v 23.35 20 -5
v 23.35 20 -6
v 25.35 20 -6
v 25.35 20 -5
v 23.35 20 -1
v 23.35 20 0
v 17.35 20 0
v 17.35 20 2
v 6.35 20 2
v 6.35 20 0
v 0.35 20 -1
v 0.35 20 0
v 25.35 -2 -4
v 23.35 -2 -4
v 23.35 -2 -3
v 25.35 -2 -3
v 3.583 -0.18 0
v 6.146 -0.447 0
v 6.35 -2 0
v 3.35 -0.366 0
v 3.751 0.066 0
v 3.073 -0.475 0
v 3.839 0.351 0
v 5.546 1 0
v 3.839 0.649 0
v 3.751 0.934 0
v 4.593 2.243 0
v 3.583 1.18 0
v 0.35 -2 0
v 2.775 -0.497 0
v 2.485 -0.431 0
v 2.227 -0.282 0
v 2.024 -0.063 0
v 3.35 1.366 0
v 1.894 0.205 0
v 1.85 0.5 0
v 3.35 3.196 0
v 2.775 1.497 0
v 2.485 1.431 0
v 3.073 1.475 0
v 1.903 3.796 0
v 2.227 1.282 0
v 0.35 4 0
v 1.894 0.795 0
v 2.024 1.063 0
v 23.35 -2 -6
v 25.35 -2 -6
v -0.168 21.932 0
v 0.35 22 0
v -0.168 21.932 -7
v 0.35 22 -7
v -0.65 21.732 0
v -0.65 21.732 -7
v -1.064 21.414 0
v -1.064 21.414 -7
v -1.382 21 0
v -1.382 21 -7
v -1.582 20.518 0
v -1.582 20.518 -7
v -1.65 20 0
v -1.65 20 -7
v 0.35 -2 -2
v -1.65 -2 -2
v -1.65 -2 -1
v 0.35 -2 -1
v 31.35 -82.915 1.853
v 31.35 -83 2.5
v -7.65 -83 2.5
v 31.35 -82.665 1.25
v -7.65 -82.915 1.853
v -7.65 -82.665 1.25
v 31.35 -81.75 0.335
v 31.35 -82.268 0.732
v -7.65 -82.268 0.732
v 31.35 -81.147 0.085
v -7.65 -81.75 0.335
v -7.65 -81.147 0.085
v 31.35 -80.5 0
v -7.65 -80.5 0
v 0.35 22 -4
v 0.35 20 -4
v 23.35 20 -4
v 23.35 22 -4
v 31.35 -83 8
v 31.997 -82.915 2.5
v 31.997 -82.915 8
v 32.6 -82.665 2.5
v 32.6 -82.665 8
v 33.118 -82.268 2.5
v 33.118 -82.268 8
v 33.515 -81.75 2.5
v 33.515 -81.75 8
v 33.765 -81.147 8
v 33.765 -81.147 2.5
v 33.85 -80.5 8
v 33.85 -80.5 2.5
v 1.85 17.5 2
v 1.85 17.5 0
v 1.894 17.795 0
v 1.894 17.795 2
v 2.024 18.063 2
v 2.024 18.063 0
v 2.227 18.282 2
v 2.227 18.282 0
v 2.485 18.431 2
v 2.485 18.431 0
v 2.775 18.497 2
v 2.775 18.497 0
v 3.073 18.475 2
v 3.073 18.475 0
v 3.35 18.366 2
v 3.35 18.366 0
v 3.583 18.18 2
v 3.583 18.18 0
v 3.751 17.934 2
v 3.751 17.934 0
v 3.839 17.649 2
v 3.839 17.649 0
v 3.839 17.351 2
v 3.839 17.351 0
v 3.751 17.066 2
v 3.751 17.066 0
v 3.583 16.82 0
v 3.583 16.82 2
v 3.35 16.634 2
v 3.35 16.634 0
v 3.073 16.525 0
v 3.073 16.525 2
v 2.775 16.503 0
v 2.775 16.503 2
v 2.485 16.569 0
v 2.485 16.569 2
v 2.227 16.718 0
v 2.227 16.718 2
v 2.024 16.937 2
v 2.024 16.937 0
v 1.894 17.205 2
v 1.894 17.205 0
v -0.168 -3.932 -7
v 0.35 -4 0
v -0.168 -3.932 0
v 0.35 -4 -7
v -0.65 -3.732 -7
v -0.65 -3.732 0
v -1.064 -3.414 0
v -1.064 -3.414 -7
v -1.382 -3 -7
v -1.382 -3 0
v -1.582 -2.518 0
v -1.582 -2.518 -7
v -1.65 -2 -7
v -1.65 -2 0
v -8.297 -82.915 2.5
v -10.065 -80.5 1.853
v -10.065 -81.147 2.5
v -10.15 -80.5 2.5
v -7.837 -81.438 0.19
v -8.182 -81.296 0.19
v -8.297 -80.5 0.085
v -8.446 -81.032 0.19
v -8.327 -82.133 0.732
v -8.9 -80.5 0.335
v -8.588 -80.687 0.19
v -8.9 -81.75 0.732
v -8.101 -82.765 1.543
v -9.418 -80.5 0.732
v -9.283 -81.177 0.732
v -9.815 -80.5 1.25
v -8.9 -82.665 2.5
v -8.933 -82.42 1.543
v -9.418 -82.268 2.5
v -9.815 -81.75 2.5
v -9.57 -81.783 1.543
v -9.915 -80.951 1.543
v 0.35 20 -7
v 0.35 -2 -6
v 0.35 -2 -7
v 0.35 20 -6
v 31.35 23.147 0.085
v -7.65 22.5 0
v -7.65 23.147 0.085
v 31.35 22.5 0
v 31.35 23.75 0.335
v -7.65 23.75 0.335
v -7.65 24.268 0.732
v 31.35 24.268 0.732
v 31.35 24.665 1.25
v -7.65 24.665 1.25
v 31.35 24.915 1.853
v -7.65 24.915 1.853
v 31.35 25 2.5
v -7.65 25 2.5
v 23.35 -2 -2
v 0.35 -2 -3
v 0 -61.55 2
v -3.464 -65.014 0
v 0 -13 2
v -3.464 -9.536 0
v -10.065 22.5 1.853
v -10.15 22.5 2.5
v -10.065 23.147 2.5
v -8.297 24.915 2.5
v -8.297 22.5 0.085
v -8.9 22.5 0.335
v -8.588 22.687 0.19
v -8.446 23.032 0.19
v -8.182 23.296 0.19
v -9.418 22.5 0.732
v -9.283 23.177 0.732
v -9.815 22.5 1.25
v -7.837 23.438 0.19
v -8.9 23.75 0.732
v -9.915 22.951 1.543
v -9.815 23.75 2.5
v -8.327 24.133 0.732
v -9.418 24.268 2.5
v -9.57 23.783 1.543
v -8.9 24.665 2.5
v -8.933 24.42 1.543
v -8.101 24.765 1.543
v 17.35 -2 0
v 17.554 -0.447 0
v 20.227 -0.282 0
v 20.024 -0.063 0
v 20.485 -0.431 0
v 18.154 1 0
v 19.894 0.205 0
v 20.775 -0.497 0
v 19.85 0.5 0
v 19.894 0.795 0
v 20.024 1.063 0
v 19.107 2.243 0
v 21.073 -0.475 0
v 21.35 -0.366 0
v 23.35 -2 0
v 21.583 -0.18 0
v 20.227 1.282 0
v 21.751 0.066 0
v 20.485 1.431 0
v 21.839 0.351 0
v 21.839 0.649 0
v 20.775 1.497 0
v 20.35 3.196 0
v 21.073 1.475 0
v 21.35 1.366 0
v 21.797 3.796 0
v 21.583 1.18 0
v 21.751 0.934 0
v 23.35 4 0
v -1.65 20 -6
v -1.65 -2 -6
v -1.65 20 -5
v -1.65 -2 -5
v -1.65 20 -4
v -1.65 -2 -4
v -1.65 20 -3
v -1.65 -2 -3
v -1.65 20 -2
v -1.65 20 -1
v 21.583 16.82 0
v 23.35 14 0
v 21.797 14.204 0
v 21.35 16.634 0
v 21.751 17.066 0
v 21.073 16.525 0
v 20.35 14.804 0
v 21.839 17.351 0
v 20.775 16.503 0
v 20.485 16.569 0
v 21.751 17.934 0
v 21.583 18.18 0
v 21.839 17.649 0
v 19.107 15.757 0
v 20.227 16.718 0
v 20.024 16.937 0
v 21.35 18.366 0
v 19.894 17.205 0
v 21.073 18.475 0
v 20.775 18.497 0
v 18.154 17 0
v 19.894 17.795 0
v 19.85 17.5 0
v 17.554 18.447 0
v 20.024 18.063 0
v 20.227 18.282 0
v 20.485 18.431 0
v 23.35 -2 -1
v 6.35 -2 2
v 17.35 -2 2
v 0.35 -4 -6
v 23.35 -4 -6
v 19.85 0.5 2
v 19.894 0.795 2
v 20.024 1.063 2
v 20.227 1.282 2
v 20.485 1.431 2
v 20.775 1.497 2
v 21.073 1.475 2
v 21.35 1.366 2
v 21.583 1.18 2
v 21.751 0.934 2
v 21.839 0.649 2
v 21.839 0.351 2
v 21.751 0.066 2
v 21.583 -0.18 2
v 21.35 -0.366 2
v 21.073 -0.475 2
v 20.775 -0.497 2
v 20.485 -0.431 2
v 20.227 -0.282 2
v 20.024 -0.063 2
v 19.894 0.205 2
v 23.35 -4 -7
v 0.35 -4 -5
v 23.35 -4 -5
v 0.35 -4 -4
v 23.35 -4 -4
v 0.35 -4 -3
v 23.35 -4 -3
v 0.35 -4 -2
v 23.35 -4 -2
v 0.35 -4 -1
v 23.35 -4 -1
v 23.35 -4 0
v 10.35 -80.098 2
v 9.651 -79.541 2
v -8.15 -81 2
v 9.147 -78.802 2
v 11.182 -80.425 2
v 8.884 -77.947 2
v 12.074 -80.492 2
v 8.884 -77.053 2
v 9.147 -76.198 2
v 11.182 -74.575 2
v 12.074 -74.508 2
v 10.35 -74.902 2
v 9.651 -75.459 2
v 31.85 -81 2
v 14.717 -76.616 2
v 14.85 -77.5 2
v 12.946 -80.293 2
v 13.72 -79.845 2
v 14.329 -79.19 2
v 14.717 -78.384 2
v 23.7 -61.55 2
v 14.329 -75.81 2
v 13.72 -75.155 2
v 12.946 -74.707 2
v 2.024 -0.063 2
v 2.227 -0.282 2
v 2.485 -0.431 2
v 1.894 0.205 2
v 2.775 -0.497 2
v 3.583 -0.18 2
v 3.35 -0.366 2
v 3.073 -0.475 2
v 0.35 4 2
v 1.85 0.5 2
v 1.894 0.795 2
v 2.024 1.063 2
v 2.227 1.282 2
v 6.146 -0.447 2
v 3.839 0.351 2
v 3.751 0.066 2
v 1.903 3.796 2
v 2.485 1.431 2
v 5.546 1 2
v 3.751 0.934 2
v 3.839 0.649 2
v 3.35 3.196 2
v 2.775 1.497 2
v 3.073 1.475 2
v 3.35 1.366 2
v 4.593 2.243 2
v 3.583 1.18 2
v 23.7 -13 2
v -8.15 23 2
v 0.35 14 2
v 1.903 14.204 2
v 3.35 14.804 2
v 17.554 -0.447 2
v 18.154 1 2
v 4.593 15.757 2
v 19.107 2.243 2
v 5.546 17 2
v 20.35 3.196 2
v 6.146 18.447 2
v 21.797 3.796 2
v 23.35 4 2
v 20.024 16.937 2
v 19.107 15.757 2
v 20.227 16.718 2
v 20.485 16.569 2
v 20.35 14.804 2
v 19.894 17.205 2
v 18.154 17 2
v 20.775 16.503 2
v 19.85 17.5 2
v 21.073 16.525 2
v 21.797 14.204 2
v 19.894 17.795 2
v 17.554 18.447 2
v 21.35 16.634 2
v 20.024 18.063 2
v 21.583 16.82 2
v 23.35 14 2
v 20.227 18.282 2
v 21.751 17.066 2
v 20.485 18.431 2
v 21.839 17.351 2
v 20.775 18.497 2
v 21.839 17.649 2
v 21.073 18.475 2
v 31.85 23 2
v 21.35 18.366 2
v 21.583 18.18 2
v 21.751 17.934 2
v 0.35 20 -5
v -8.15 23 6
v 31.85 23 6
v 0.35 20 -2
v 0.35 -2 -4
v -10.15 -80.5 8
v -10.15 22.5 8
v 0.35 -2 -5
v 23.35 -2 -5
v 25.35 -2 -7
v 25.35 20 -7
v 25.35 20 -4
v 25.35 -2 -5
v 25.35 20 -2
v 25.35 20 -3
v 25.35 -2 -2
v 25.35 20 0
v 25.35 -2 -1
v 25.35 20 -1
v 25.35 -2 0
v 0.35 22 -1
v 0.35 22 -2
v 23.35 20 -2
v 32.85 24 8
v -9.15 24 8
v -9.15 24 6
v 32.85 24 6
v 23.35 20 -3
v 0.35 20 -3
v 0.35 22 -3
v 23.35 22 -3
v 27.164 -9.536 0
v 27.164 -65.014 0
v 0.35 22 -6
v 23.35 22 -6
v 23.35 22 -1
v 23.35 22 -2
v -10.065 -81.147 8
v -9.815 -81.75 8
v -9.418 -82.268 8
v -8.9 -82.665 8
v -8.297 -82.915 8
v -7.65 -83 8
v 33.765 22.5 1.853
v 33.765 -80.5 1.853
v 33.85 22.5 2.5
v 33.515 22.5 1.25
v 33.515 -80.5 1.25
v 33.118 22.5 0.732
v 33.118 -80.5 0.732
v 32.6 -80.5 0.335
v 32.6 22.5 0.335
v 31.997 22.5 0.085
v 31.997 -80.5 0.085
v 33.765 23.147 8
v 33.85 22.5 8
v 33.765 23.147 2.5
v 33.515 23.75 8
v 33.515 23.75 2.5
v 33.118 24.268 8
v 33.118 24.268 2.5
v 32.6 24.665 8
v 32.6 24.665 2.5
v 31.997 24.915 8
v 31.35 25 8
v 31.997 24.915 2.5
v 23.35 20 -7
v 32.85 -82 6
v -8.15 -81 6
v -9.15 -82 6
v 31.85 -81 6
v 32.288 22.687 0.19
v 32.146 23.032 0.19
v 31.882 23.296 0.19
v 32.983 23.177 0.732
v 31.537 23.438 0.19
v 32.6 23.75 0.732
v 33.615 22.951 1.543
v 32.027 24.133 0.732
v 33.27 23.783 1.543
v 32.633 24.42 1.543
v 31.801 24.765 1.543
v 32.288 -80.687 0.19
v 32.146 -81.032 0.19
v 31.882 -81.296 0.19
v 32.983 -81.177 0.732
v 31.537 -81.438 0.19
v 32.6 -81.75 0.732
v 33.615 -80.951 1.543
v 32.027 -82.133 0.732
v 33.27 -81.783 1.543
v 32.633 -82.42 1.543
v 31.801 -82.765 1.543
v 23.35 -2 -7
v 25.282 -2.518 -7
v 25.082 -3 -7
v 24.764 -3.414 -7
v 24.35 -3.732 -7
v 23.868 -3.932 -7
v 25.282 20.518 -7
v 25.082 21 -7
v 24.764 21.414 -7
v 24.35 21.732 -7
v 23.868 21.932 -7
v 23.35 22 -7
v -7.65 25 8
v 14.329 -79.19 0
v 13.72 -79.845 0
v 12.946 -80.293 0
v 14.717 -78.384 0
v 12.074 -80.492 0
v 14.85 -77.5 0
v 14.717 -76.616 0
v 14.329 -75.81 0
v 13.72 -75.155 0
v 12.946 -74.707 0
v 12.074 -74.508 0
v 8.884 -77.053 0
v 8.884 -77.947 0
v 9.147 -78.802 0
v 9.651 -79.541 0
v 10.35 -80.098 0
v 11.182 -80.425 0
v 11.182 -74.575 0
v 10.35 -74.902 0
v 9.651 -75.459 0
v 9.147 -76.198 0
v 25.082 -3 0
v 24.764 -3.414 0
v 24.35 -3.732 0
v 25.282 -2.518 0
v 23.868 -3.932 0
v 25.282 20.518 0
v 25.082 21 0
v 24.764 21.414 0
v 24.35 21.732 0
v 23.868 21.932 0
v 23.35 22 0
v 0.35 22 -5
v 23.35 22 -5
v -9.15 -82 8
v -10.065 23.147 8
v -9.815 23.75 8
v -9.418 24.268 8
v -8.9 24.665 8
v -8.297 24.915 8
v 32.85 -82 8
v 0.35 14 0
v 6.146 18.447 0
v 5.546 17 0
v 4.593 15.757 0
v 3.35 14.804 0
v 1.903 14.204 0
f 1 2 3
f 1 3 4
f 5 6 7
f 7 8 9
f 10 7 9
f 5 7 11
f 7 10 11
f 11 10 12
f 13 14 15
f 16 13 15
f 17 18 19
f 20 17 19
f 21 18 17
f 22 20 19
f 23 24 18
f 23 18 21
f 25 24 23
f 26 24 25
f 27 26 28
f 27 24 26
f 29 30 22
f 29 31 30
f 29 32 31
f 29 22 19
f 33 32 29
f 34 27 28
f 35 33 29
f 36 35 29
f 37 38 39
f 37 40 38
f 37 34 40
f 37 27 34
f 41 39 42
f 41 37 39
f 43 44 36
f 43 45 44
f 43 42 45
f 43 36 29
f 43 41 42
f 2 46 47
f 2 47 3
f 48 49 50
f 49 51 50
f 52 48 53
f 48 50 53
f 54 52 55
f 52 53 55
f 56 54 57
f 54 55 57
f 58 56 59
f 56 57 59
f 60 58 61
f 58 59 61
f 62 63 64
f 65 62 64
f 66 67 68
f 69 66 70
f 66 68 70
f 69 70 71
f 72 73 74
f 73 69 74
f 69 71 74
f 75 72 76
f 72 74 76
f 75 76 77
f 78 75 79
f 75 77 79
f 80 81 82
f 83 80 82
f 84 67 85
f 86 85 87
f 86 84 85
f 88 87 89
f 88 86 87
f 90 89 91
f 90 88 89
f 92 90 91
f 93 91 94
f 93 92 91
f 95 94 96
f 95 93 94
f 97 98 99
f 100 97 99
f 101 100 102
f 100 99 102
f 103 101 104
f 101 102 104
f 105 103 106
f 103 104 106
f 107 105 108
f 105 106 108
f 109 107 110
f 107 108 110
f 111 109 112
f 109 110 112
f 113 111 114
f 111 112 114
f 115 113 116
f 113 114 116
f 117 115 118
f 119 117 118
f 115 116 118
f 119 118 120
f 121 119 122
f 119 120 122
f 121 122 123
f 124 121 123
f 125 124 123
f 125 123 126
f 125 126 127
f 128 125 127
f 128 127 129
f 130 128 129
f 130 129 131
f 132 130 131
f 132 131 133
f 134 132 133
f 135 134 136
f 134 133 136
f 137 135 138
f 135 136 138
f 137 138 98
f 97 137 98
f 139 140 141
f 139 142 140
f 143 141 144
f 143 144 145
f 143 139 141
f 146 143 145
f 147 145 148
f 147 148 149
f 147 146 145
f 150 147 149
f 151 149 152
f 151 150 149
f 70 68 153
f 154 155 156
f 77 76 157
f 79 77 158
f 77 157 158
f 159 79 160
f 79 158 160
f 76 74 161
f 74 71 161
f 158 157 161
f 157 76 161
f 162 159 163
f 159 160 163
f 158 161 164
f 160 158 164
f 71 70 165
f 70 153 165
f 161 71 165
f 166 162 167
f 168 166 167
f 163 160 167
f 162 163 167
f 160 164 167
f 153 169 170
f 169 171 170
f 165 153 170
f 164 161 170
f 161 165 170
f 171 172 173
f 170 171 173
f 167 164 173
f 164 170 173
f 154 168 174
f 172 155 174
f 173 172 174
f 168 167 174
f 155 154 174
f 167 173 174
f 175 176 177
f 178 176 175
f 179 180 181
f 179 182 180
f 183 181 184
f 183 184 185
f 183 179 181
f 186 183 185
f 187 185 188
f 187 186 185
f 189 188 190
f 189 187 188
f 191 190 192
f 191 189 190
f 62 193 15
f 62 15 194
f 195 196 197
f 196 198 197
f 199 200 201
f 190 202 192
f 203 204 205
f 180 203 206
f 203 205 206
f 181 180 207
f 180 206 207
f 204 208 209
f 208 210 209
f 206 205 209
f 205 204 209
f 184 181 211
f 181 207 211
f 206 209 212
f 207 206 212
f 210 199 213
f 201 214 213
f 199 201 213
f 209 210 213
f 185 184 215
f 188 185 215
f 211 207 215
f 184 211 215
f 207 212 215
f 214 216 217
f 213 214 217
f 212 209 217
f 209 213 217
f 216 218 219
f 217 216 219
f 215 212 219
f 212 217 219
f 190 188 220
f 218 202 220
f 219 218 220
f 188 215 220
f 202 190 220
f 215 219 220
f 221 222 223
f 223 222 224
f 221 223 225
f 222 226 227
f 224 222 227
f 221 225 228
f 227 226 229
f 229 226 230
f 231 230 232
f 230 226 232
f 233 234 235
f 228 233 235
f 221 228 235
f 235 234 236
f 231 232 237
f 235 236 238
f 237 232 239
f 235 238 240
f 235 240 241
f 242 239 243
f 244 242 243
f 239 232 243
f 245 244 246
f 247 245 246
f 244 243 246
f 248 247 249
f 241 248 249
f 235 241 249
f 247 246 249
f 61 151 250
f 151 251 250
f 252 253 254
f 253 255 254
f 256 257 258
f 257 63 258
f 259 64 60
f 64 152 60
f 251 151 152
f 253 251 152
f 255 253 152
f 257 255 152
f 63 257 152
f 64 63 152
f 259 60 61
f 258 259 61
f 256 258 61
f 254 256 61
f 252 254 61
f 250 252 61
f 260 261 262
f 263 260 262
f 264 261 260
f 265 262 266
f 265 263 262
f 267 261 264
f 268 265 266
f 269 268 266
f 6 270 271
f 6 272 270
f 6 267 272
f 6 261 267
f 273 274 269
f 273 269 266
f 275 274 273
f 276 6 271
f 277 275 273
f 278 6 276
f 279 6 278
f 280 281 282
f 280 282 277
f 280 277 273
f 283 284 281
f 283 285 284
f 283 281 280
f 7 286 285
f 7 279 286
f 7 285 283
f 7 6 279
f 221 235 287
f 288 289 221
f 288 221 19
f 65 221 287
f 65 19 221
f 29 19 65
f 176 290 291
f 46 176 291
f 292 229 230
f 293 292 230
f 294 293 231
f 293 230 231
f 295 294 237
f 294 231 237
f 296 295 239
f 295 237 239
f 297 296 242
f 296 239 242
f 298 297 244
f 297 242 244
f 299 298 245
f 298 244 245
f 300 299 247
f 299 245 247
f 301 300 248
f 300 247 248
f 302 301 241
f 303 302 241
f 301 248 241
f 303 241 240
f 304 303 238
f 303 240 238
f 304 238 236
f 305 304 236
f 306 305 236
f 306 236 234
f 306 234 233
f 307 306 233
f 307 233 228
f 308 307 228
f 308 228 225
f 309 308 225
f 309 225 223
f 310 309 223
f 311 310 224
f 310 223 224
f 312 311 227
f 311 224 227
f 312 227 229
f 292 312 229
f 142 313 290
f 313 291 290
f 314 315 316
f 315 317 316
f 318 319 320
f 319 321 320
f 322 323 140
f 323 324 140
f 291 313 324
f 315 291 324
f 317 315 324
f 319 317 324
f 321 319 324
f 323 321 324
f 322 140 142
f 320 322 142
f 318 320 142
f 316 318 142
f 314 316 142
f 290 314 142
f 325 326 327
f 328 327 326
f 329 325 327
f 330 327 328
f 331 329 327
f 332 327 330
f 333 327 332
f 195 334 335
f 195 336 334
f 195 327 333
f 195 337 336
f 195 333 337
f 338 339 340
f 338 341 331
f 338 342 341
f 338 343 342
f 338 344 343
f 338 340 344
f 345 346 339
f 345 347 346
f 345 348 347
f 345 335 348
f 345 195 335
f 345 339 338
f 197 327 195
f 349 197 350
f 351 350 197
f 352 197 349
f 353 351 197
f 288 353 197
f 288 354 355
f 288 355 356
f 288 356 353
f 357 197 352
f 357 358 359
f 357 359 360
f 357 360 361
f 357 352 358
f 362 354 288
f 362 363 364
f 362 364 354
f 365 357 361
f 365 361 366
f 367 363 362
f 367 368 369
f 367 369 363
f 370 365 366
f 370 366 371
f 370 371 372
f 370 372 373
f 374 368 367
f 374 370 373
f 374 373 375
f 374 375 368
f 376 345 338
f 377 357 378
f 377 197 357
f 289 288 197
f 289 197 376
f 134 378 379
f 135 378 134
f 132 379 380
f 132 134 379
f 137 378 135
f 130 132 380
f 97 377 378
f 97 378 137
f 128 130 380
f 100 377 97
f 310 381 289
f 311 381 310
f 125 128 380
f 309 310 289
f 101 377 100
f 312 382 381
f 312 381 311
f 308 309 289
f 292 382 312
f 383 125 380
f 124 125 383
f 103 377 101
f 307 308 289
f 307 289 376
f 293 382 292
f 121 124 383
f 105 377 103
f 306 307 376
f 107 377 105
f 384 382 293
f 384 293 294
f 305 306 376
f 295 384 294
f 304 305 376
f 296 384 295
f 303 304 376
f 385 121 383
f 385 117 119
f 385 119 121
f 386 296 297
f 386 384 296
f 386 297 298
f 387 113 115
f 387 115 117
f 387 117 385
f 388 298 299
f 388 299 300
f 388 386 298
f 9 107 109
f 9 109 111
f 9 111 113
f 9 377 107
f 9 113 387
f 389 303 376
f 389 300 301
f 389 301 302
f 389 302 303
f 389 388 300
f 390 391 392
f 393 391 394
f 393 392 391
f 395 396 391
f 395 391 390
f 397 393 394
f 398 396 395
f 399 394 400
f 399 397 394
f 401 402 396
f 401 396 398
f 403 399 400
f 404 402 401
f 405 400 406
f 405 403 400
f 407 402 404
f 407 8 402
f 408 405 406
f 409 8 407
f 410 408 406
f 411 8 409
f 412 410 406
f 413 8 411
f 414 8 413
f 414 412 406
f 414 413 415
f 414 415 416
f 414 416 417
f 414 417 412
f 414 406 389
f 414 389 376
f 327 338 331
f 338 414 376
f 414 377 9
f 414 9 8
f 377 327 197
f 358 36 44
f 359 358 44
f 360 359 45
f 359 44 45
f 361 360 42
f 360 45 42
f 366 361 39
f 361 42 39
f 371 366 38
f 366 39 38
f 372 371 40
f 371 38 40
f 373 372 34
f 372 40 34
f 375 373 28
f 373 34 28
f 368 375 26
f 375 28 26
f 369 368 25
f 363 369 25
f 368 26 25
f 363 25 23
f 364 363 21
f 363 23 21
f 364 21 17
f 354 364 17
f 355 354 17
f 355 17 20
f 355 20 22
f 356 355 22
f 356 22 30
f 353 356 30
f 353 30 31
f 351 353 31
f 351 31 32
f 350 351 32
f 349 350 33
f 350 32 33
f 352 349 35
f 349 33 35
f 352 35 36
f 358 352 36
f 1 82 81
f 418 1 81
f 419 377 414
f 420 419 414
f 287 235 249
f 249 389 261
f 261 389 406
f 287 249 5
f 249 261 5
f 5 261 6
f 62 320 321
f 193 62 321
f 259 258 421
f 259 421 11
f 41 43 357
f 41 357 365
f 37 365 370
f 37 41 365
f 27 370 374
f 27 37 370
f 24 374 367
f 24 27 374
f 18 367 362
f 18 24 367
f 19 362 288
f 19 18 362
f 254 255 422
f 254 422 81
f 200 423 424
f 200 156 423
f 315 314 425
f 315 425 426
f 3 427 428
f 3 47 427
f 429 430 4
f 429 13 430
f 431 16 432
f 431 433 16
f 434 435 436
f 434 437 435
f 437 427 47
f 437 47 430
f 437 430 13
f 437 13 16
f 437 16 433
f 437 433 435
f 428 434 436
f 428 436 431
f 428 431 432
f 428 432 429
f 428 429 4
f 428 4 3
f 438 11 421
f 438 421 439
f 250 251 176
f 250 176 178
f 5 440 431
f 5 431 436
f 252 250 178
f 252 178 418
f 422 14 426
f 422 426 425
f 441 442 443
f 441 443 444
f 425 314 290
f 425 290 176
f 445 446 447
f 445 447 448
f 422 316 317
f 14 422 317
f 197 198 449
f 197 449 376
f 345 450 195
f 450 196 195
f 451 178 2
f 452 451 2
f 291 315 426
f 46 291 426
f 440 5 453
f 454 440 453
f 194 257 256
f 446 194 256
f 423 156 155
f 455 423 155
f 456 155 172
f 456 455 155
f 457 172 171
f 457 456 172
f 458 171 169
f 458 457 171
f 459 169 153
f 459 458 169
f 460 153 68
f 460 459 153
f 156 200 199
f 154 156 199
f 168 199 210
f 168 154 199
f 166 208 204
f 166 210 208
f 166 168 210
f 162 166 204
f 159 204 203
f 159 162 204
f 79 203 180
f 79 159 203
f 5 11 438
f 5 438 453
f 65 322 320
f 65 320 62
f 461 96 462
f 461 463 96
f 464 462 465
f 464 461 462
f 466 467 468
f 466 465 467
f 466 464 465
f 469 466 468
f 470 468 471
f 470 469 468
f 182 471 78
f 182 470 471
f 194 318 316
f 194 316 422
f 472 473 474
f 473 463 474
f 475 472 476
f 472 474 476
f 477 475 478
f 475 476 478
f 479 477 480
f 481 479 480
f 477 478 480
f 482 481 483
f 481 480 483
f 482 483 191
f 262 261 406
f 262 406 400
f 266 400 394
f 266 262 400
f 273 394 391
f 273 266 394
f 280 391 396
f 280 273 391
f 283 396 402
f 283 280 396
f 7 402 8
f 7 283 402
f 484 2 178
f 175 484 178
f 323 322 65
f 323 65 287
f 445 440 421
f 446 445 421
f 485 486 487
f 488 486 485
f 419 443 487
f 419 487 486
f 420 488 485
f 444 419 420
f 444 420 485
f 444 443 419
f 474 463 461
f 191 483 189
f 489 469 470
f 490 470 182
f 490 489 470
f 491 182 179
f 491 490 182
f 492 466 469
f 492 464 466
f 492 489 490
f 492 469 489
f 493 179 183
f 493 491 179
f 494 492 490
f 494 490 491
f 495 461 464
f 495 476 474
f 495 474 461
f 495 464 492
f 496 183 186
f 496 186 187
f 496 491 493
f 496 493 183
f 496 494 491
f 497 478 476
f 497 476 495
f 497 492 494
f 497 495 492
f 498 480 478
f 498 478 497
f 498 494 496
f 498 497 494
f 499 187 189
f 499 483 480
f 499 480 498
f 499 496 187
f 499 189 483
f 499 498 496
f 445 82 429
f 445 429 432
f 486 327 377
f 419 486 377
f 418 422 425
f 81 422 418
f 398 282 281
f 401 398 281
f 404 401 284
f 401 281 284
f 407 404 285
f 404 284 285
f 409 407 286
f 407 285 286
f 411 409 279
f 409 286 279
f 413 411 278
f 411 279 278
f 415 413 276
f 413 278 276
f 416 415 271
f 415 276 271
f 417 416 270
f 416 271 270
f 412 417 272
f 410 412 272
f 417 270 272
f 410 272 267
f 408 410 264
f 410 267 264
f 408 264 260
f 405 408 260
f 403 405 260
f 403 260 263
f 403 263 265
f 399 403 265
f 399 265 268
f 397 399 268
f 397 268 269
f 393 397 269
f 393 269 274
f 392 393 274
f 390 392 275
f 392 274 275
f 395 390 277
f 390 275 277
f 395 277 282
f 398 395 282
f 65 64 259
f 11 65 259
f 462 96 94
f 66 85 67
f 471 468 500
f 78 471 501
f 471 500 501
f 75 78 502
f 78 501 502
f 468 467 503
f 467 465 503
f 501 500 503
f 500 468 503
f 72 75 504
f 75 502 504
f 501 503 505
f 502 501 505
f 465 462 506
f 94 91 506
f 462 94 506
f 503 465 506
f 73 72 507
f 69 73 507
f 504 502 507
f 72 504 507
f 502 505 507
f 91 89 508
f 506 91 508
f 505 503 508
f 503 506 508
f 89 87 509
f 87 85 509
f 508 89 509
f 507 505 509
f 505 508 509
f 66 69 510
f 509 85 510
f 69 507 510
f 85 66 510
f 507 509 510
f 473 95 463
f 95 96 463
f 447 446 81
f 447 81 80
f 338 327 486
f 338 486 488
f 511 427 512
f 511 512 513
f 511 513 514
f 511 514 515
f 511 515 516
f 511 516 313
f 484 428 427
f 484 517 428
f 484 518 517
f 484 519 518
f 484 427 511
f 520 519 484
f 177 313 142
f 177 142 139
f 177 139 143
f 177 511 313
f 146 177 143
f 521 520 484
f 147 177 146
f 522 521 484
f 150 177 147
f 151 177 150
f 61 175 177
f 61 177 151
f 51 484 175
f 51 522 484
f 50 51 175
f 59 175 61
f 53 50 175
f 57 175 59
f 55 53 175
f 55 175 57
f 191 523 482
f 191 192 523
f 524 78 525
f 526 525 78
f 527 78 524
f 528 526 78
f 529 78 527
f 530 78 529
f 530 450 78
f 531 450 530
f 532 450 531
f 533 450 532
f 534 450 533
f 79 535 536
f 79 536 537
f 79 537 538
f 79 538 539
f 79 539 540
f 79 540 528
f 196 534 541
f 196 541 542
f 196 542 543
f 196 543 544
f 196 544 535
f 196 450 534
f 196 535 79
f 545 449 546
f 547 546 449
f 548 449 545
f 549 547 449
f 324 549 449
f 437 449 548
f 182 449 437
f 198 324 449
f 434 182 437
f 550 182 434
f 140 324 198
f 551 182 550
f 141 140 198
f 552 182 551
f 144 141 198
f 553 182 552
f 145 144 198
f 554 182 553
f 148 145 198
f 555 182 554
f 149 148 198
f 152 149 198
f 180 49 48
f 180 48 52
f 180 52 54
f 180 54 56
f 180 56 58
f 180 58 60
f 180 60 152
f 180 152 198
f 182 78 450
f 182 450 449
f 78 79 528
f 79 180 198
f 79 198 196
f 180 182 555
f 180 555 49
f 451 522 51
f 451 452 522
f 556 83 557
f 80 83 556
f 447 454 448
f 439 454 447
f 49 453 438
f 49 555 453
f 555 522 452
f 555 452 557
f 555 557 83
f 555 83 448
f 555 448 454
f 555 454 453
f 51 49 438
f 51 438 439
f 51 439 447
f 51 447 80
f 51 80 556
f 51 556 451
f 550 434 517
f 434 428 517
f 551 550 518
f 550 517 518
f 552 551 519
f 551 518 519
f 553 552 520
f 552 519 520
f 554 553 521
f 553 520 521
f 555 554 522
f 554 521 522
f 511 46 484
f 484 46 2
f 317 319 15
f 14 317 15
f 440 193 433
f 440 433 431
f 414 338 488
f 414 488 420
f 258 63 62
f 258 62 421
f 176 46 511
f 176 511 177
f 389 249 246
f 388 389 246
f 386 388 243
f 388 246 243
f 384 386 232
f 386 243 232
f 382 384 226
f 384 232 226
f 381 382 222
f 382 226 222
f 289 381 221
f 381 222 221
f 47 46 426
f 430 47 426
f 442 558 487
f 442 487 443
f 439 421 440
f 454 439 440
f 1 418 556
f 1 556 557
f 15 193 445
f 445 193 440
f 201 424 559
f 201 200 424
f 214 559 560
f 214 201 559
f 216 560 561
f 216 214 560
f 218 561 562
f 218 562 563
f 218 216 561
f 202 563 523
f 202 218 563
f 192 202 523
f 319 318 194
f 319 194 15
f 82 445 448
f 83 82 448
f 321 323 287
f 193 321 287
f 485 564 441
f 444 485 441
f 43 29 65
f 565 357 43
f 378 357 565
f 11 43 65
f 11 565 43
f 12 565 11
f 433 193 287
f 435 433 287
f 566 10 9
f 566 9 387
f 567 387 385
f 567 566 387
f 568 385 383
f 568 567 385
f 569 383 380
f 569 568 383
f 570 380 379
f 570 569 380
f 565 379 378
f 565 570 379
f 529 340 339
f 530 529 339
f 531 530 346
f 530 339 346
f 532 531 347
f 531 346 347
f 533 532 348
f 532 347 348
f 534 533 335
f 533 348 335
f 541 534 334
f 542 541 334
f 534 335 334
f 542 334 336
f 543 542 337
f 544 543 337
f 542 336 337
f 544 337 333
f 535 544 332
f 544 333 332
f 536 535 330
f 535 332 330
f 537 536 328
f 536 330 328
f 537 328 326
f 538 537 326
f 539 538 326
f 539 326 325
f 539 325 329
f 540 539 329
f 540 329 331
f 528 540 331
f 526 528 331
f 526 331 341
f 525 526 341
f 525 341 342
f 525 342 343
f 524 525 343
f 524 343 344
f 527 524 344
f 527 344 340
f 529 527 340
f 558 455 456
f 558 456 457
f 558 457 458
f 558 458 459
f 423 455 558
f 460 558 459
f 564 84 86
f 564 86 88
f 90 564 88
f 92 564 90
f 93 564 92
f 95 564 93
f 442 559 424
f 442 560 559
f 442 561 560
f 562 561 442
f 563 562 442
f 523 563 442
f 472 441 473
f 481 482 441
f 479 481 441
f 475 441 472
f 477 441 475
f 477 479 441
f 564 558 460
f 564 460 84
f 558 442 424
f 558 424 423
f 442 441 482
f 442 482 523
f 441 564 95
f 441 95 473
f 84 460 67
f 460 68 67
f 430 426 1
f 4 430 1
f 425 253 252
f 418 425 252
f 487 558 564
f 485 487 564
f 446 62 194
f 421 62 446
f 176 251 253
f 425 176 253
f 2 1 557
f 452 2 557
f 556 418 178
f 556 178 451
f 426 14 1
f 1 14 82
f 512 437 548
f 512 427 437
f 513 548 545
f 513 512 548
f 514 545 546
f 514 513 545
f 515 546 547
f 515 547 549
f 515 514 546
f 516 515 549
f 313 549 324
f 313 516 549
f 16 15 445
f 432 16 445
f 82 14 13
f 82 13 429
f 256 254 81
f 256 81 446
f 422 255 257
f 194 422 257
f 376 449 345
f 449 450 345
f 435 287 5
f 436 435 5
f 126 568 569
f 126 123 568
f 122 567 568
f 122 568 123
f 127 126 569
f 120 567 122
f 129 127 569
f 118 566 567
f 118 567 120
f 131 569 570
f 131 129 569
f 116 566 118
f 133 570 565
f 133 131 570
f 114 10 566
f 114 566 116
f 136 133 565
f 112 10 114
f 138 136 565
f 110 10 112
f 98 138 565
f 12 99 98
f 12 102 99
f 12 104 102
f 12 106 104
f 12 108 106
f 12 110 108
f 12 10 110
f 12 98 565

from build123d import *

# Parameters (mm, degrees)
SKICA1_W                 = 23.7
SKICA1_H                 = 48.55
SKICA1_W_2               = 23
SKICA1_H_2               = 22
P_IDAT_VYSUNUT_M1_DEPTH  = 2
SKICA3_R                 = 3
ODEBRAT_VYSUNUT_M1_DEPTH = 4
ZKOSEN_1_SIZE            = 3.464101615
ZKOSEN_1_SIZE_2          = 2
SKICA5_W                 = 44
SKICA5_H                 = 108
SKICA5_W_2               = 40
SKICA5_H_2               = 104
P_IDAT_VYSUNUT_M3_DEPTH  = 6
ZAOBLIT2_R               = 2.5
SKICA6_W                 = 27
SKICA6_H                 = 26
SKICA6_W_2               = 23
SKICA6_H_2               = 22
P_IDAT_VYSUNUT_M4_DEPTH  = 7
SKICA7_R                 = 1
P_IDAT_VYSUNUT_M5_DEPTH  = 2
SKICA8_W                 = 23
SKICA8_H                 = 1
ODEBRAT_VYSUNUT_M3_DEPTH = 30
SKICA9_W                 = 1
SKICA9_H                 = 22
ODEBRAT_VYSUNUT_M4_DEPTH = 30
ZAOBLIT3_R               = 2
SKICA10_W                = 42
SKICA10_H                = 106
SKICA10_W_2              = 40
SKICA10_H_2              = 104
ODEBRAT_VYSUNUT_M5_DEPTH = 2


# Some blends are built 0.0001 mm under size
with BuildPart() as part:
    # Skica1 → Přidat vysunutím1 (new body)
    with BuildSketch(Plane.XY):
        Polygon((-10.15, 2), (-10.15, 25), (33.85, 25), (33.85, 2), (33.85, -83), (-10.15, -83), (-10.15, -61.55), align=None)
        with Locations((11.85, -37.275)):
            Rectangle(SKICA1_W, SKICA1_H, mode=Mode.SUBTRACT)
        with Locations((11.85, 9)):
            Rectangle(SKICA1_W_2, SKICA1_H_2, mode=Mode.SUBTRACT)
    extrude(amount=P_IDAT_VYSUNUT_M1_DEPTH)

    # Skica3 → Odebrat vysunutím1 (cut)
    with BuildSketch(Plane.XY.offset(2)):
        with Locations((11.85, -77.5)):
            Circle(SKICA3_R)
    extrude(amount=-ODEBRAT_VYSUNUT_M1_DEPTH, mode=Mode.SUBTRACT)

    # Zkosení1
    # the kernel refuses this chamfer: 3.464101615, 2 mm, written as the material it takes off along each edge
    with BuildSketch(Plane(origin=(0, -13, 0), x_dir=(-0.9998132206222079, 0, -0.019326765612700626), z_dir=(0, -1, 0)), Plane(origin=(23.7, -61.55, 0), x_dir=(0.9998132206222079, 0, -0.019326765612700608), z_dir=(0, 1, 0))) as zkosen_1_piece_1:
        Polygon((ZKOSEN_1_SIZE * 0.999813220662, -ZKOSEN_1_SIZE * 0.0193267656135), (-ZKOSEN_1_SIZE_2 * 0.0193267656127, -ZKOSEN_1_SIZE_2 * 0.999813220622), (0, 0), align=None)
    extrude(amount=48.55, mode=Mode.SUBTRACT)
    with BuildSketch(Plane(origin=(0, -61.55, 0), x_dir=(0, -0.9998132206222079, -0.01932676561270056), z_dir=(1, 0, 0)), Plane(origin=(23.7, -13, 0), x_dir=(0, 0.9998132206222079, -0.019326765612700643), z_dir=(-1, 0, 0))) as zkosen_1_piece_2:
        Polygon((ZKOSEN_1_SIZE * 0.999813220662, -ZKOSEN_1_SIZE * 0.0193267656135), (-ZKOSEN_1_SIZE_2 * 0.0193267656127, -ZKOSEN_1_SIZE_2 * 0.999813220622), (0, 0), align=None)
    extrude(amount=23.7, mode=Mode.SUBTRACT)
    with BuildSketch(Plane(origin=(0, -4.038072059, 0), x_dir=(-0.9998132206222079, 0, -0.019326765612700622), z_dir=(0, -1, 0))) as zkosen_1_piece_3a_section:
        Polygon((ZKOSEN_1_SIZE * 0.999813220662, -ZKOSEN_1_SIZE * 0.0193267656135), (-ZKOSEN_1_SIZE_2 * 0.0193267656127, -ZKOSEN_1_SIZE_2 * 0.999813220622), (0, 0), align=None)
    zkosen_1_piece_3a = extrude(amount=57.511927941, mode=Mode.PRIVATE)
    zkosen_1_piece_3a = split(zkosen_1_piece_3a, bisect_by=Plane(origin=(-1.161798269, -13, 0.64133979), z_dir=(0, 1, 0)), keep=Keep.TOP, mode=Mode.PRIVATE)
    with BuildSketch(Plane(origin=(23.7, -13, 0), x_dir=(0, 0.9998132206222079, -0.019326765612700643), z_dir=(-1, 0, 0))) as zkosen_1_piece_3b_section:
        Polygon((ZKOSEN_1_SIZE * 0.999813220662, -ZKOSEN_1_SIZE * 0.0193267656135), (-ZKOSEN_1_SIZE_2 * 0.0193267656127, -ZKOSEN_1_SIZE_2 * 0.999813220622), (0, 0), align=None)
    zkosen_1_piece_3b = extrude(amount=32.661927941, mode=Mode.PRIVATE)
    zkosen_1_piece_3b = split(zkosen_1_piece_3b, bisect_by=Plane(origin=(0, -11.838201731, 0.64133979), z_dir=(-1, 0, 0)), keep=Keep.TOP, mode=Mode.PRIVATE)
    zkosen_1_piece_3 = zkosen_1_piece_3a & zkosen_1_piece_3b
    add(zkosen_1_piece_3, mode=Mode.SUBTRACT)
    with BuildSketch(Plane(origin=(0, -13, 0), x_dir=(-0.9998132206222079, 0, -0.019326765612700626), z_dir=(0, -1, 0))) as zkosen_1_piece_4a_section:
        Polygon((ZKOSEN_1_SIZE * 0.999813220662, -ZKOSEN_1_SIZE * 0.0193267656135), (-ZKOSEN_1_SIZE_2 * 0.0193267656127, -ZKOSEN_1_SIZE_2 * 0.999813220622), (0, 0), align=None)
    zkosen_1_piece_4a = extrude(amount=57.511927941, mode=Mode.PRIVATE)
    zkosen_1_piece_4a = split(zkosen_1_piece_4a, bisect_by=Plane(origin=(-1.161798269, -61.55, 0.64133979), z_dir=(0, -1, 0)), keep=Keep.TOP, mode=Mode.PRIVATE)
    with BuildSketch(Plane(origin=(-8.961927941, -61.55, 0), x_dir=(0, -0.9998132206222079, -0.01932676561270056), z_dir=(1, 0, 0))) as zkosen_1_piece_4b_section:
        Polygon((ZKOSEN_1_SIZE * 0.999813220662, -ZKOSEN_1_SIZE * 0.0193267656135), (-ZKOSEN_1_SIZE_2 * 0.0193267656127, -ZKOSEN_1_SIZE_2 * 0.999813220622), (0, 0), align=None)
    zkosen_1_piece_4b = extrude(amount=32.661927941, mode=Mode.PRIVATE)
    zkosen_1_piece_4b = split(zkosen_1_piece_4b, bisect_by=Plane(origin=(0, -62.711798269, 0.64133979), z_dir=(-1, 0, 0)), keep=Keep.TOP, mode=Mode.PRIVATE)
    zkosen_1_piece_4 = zkosen_1_piece_4a & zkosen_1_piece_4b
    add(zkosen_1_piece_4, mode=Mode.SUBTRACT)
    with BuildSketch(Plane(origin=(0, -61.55, 0), x_dir=(0, -0.9998132206222079, -0.01932676561270056), z_dir=(1, 0, 0))) as zkosen_1_piece_5a_section:
        Polygon((ZKOSEN_1_SIZE * 0.999813220662, -ZKOSEN_1_SIZE * 0.0193267656135), (-ZKOSEN_1_SIZE_2 * 0.0193267656127, -ZKOSEN_1_SIZE_2 * 0.999813220622), (0, 0), align=None)
    zkosen_1_piece_5a = extrude(amount=32.661927941, mode=Mode.PRIVATE)
    zkosen_1_piece_5a = split(zkosen_1_piece_5a, bisect_by=Plane(origin=(23.7, -62.711798269, 0.64133979), z_dir=(1, 0, 0)), keep=Keep.TOP, mode=Mode.PRIVATE)
    with BuildSketch(Plane(origin=(23.7, -70.511927941, 0), x_dir=(0.9998132206222079, 0, -0.019326765612700608), z_dir=(0, 1, 0))) as zkosen_1_piece_5b_section:
        Polygon((ZKOSEN_1_SIZE * 0.999813220662, -ZKOSEN_1_SIZE * 0.0193267656135), (-ZKOSEN_1_SIZE_2 * 0.0193267656127, -ZKOSEN_1_SIZE_2 * 0.999813220622), (0, 0), align=None)
    zkosen_1_piece_5b = extrude(amount=57.511927941, mode=Mode.PRIVATE)
    zkosen_1_piece_5b = split(zkosen_1_piece_5b, bisect_by=Plane(origin=(24.861798269, -61.55, 0.64133979), z_dir=(0, -1, 0)), keep=Keep.TOP, mode=Mode.PRIVATE)
    zkosen_1_piece_5 = zkosen_1_piece_5a & zkosen_1_piece_5b
    add(zkosen_1_piece_5, mode=Mode.SUBTRACT)
    with BuildSketch(Plane(origin=(32.661927941, -13, 0), x_dir=(0, 0.9998132206222079, -0.019326765612700643), z_dir=(-1, 0, 0))) as zkosen_1_piece_6a_section:
        Polygon((ZKOSEN_1_SIZE * 0.999813220662, -ZKOSEN_1_SIZE * 0.0193267656135), (-ZKOSEN_1_SIZE_2 * 0.0193267656127, -ZKOSEN_1_SIZE_2 * 0.999813220622), (0, 0), align=None)
    zkosen_1_piece_6a = extrude(amount=32.661927941, mode=Mode.PRIVATE)
    zkosen_1_piece_6a = split(zkosen_1_piece_6a, bisect_by=Plane(origin=(23.7, -11.838201731, 0.64133979), z_dir=(1, 0, 0)), keep=Keep.TOP, mode=Mode.PRIVATE)
    with BuildSketch(Plane(origin=(23.7, -61.55, 0), x_dir=(0.9998132206222079, 0, -0.019326765612700608), z_dir=(0, 1, 0))) as zkosen_1_piece_6b_section:
        Polygon((ZKOSEN_1_SIZE * 0.999813220662, -ZKOSEN_1_SIZE * 0.0193267656135), (-ZKOSEN_1_SIZE_2 * 0.0193267656127, -ZKOSEN_1_SIZE_2 * 0.999813220622), (0, 0), align=None)
    zkosen_1_piece_6b = extrude(amount=57.511927941, mode=Mode.PRIVATE)
    zkosen_1_piece_6b = split(zkosen_1_piece_6b, bisect_by=Plane(origin=(24.861798269, -13, 0.64133979), z_dir=(0, 1, 0)), keep=Keep.TOP, mode=Mode.PRIVATE)
    zkosen_1_piece_6 = zkosen_1_piece_6a & zkosen_1_piece_6b
    add(zkosen_1_piece_6, mode=Mode.SUBTRACT)

    # Skica5 → Přidat vysunutím3 (add)
    with BuildSketch(Plane.XY.offset(2)):
        with Locations((11.85, -29)):
            Rectangle(SKICA5_W, SKICA5_H)
        with Locations((11.85, -29)):
            Rectangle(SKICA5_W_2, SKICA5_H_2, mode=Mode.SUBTRACT)
    extrude(amount=P_IDAT_VYSUNUT_M3_DEPTH)

    # Zaoblit2
    zaoblit2_edges = [part.edges().sort_by_distance(p)[0] for p in [
        (33.85, -83, 4),
        (-10.15, -83, 4),
        (-10.15, 25, 4),
        (33.85, 25, 4),
        (33.85, -29, 0),
        (11.85, -83, 0),
        (-10.15, -29, 0),
        (11.85, 25, 0),
    ]]
    fillet(zaoblit2_edges, radius=ZAOBLIT2_R - 0.0001)  # a hair under: the kernel refuses the full size

    # Skica6 → Přidat vysunutím4 (add)
    with BuildSketch(Plane(origin=(0, 0, 0), x_dir=(-1, 0, 0), z_dir=(0, 0, -1))):
        with Locations((-11.85, 9)):
            Rectangle(SKICA6_W, SKICA6_H)
        with Locations((-11.85, 9)):
            Rectangle(SKICA6_W_2, SKICA6_H_2, mode=Mode.SUBTRACT)
    extrude(amount=P_IDAT_VYSUNUT_M4_DEPTH)

    # Skica7 → Přidat vysunutím5 (add)
    # profile 1 of 4: a face of its own
    with BuildSketch(Plane(origin=(0, 0, 0), x_dir=(-1, 0, 0), z_dir=(0, 0, -1))):
        with BuildLine():
            Line((-23.35, -2), (-23.35, 4))
            ThreePointArc((-23.35, 4), (-19.107359313, 2.242640687), (-17.35, -2))
            Line((-17.35, -2), (-23.35, -2))
        make_face()
        with Locations((-20.85, 0.5)):
            Circle(SKICA7_R, mode=Mode.SUBTRACT)
    # profile 2 of 4: a face of its own
    with BuildSketch(Plane(origin=(0, 0, 0), x_dir=(-1, 0, 0), z_dir=(0, 0, -1))):
        with BuildLine():
            Line((-0.35, 20), (-6.35, 20))
            ThreePointArc((-6.35, 20), (-4.592640687, 15.757359313), (-0.35, 14))
            Line((-0.35, 14), (-0.35, 20))
        make_face()
        with Locations((-2.85, 17.5)):
            Circle(SKICA7_R, mode=Mode.SUBTRACT)
    # profile 3 of 4: a face of its own
    with BuildSketch(Plane(origin=(0, 0, 0), x_dir=(-1, 0, 0), z_dir=(0, 0, -1))):
        with BuildLine():
            Line((-0.35, -2), (-0.35, 4))
            ThreePointArc((-0.35, 4), (-4.592640687, 2.242640687), (-6.35, -2))
            Line((-6.35, -2), (-0.35, -2))
        make_face()
        with Locations((-2.85, 0.5)):
            Circle(SKICA7_R, mode=Mode.SUBTRACT)
    # profile 4 of 4: a face of its own
    with BuildSketch(Plane(origin=(0, 0, 0), x_dir=(-1, 0, 0), z_dir=(0, 0, -1))):
        with BuildLine():
            Line((-23.35, 20), (-23.35, 14))
            ThreePointArc((-23.35, 14), (-19.107359313, 15.757359313), (-17.35, 20))
            Line((-17.35, 20), (-23.35, 20))
        make_face()
        with Locations((-20.85, 17.5)):
            Circle(SKICA7_R, mode=Mode.SUBTRACT)
    extrude(amount=-P_IDAT_VYSUNUT_M5_DEPTH)

    # Skica8 → Odebrat vysunutím3 (cut)
    with BuildSketch(Plane.XZ.offset(4)):
        with Locations((11.85, -5.5)):
            Rectangle(SKICA8_W, SKICA8_H)
        with Locations((11.85, -3.5)):
            Rectangle(SKICA8_W, SKICA8_H)
        with Locations((11.85, -1.5)):
            Rectangle(SKICA8_W, SKICA8_H)
    extrude(amount=-ODEBRAT_VYSUNUT_M3_DEPTH, mode=Mode.SUBTRACT)

    # Skica9 → Odebrat vysunutím4 (cut)
    with BuildSketch(Plane.ZY.offset(1.65)):
        with Locations((-5.5, 9)):
            Rectangle(SKICA9_W, SKICA9_H)
        with Locations((-3.5, 9)):
            Rectangle(SKICA9_W, SKICA9_H)
        with Locations((-1.5, 9)):
            Rectangle(SKICA9_W, SKICA9_H)
    extrude(amount=-ODEBRAT_VYSUNUT_M4_DEPTH, mode=Mode.SUBTRACT)

    # Zaoblit3
    zaoblit3_edges = [part.edges().sort_by_distance(p)[0] for p in [
        (-1.65, -4, -3.5),
        (-1.65, 22, -3.5),
        (25.35, 22, -3.5),
        (25.35, -4, -3.5),
    ]]
    fillet(zaoblit3_edges, radius=ZAOBLIT3_R - 0.0001)  # a hair under: the kernel refuses the full size

    # Skica10 → Odebrat vysunutím5 (cut)
    with BuildSketch(Plane.XY.offset(8)):
        with Locations((11.85, -29)):
            Rectangle(SKICA10_W, SKICA10_H)
        with Locations((11.85, -29)):
            Rectangle(SKICA10_W_2, SKICA10_H_2, mode=Mode.SUBTRACT)
    extrude(amount=-ODEBRAT_VYSUNUT_M5_DEPTH, mode=Mode.SUBTRACT)


solid = part.part
